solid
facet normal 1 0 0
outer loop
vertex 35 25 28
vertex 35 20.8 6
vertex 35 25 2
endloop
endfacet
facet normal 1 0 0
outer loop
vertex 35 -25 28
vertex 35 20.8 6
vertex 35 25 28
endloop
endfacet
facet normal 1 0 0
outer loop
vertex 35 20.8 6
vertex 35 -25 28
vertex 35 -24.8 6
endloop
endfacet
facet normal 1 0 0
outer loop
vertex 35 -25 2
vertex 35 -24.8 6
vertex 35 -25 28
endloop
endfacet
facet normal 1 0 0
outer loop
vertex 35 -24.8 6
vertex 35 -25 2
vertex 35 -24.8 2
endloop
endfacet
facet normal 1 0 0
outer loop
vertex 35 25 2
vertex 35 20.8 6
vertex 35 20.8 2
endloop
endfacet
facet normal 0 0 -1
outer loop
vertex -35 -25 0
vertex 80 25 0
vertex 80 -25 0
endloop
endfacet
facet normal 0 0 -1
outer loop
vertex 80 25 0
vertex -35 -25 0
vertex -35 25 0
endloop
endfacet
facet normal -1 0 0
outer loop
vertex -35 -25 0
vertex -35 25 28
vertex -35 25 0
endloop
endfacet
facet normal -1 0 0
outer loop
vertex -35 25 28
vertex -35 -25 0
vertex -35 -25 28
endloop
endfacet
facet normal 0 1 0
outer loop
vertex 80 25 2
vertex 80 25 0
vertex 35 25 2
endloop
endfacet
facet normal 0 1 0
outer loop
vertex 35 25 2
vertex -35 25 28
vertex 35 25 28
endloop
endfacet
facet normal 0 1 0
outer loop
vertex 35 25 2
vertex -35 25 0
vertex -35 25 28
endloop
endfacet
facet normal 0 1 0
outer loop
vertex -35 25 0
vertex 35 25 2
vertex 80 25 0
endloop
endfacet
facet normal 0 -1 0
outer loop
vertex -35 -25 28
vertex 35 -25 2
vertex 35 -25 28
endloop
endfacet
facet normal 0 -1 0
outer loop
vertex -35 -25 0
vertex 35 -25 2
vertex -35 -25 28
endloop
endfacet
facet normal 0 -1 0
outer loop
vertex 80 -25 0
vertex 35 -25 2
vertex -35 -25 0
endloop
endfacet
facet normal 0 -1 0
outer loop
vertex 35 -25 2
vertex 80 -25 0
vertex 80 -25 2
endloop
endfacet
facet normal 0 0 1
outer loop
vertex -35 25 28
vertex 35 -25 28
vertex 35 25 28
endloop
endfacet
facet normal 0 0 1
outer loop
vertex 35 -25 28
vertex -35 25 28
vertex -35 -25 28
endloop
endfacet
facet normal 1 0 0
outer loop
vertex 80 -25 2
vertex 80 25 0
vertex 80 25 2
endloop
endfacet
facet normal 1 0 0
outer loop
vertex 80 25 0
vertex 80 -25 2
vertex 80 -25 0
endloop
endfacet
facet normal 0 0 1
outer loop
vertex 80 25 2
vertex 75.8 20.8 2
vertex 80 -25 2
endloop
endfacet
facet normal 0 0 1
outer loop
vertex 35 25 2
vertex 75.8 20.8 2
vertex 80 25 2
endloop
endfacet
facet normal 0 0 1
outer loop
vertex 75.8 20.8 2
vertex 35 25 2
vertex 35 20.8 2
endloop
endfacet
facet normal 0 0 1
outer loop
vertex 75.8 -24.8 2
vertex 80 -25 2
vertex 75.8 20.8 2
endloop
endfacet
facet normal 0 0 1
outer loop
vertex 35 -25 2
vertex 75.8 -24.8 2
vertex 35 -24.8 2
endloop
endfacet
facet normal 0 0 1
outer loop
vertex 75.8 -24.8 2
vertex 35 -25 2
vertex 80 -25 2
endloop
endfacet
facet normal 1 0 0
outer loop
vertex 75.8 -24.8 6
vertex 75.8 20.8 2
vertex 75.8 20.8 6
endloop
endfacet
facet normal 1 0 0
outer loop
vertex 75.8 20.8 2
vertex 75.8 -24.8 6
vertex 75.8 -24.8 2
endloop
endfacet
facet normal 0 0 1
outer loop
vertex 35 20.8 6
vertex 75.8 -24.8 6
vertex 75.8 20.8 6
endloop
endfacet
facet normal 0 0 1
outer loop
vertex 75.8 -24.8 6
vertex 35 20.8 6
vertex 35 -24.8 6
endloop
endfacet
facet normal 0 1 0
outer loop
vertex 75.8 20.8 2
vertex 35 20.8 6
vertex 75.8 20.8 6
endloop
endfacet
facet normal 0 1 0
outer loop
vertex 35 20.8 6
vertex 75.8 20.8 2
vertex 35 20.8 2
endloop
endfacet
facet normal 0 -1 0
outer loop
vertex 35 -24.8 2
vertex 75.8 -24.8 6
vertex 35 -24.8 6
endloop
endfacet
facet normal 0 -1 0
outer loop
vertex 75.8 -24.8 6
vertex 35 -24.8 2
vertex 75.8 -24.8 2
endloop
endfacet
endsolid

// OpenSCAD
// Two-part enclosure for a small electronics board (e.g. Arduino-based temperature logger)
// Print orientation: both parts lie on the bed (z = 0), side by side, with a 10 mm gap.
// They print together as one solid.

// ---------------- Parameters ----------------
box_x      = 70;    // box outer length (X)
box_y      = 50;    // box outer width (Y)
box_z      = 30;    // box outer height (Z)
wall       = 2;     // box wall thickness
floor      = 2;     // box floor thickness
lip_t      = 1.5;   // lid lip wall thickness
lip_h      = 4;     // lid lip height (from top of plate)
lip_outer_x = 65.6; // outer size of lip in X
lip_outer_y = 45.6; // outer size of lip in Y
clearance  = 0.2;   // clearance between lip outer size and box opening
eps        = 0.5;   // overcut for clean boolean differences
gap        = 10;    // gap between the two printed parts

$fn = 64;

// Derived
lip_wall_x = lip_outer_x - box_x + clearance * 2;   // = -4.4 (lip is narrower in X)
lip_wall_y = lip_outer_y - box_y + clearance * 2;   // = -4.4 (lip is narrower in Y)
// The lip is centred on the plate, so its centre is at x = 32.8, y = 25
// (the same as the box centre). It slides in with clearance on each side.

// ---------------- Modules ----------------
module box() {
    difference() {
        translate([-box_x/2, -box_y/2, 0])
            cube([box_x, box_y, box_z]);
        // open top: cut a channel through the top wall
        translate([-box_x/2, -box_y/2, box_z - floor])
            cube([box_x, box_y, floor + eps]);
    }
}

module lid() {
    // Plate lying on the bed
    translate([-box_x/2, -box_y/2, 0])
        cube([box_x, box_y, 2]);
    // Lip on top of the plate, centred on it
    translate([-box_x/2 + clearance, -box_y/2 + clearance, 2])
        cube([lip_outer_x, lip_outer_y, lip_h]);
}

// ---------------- Assembly ----------------
union() {
    box();
    translate([box_x/2 + gap, 0, 0])
        lid();
}
